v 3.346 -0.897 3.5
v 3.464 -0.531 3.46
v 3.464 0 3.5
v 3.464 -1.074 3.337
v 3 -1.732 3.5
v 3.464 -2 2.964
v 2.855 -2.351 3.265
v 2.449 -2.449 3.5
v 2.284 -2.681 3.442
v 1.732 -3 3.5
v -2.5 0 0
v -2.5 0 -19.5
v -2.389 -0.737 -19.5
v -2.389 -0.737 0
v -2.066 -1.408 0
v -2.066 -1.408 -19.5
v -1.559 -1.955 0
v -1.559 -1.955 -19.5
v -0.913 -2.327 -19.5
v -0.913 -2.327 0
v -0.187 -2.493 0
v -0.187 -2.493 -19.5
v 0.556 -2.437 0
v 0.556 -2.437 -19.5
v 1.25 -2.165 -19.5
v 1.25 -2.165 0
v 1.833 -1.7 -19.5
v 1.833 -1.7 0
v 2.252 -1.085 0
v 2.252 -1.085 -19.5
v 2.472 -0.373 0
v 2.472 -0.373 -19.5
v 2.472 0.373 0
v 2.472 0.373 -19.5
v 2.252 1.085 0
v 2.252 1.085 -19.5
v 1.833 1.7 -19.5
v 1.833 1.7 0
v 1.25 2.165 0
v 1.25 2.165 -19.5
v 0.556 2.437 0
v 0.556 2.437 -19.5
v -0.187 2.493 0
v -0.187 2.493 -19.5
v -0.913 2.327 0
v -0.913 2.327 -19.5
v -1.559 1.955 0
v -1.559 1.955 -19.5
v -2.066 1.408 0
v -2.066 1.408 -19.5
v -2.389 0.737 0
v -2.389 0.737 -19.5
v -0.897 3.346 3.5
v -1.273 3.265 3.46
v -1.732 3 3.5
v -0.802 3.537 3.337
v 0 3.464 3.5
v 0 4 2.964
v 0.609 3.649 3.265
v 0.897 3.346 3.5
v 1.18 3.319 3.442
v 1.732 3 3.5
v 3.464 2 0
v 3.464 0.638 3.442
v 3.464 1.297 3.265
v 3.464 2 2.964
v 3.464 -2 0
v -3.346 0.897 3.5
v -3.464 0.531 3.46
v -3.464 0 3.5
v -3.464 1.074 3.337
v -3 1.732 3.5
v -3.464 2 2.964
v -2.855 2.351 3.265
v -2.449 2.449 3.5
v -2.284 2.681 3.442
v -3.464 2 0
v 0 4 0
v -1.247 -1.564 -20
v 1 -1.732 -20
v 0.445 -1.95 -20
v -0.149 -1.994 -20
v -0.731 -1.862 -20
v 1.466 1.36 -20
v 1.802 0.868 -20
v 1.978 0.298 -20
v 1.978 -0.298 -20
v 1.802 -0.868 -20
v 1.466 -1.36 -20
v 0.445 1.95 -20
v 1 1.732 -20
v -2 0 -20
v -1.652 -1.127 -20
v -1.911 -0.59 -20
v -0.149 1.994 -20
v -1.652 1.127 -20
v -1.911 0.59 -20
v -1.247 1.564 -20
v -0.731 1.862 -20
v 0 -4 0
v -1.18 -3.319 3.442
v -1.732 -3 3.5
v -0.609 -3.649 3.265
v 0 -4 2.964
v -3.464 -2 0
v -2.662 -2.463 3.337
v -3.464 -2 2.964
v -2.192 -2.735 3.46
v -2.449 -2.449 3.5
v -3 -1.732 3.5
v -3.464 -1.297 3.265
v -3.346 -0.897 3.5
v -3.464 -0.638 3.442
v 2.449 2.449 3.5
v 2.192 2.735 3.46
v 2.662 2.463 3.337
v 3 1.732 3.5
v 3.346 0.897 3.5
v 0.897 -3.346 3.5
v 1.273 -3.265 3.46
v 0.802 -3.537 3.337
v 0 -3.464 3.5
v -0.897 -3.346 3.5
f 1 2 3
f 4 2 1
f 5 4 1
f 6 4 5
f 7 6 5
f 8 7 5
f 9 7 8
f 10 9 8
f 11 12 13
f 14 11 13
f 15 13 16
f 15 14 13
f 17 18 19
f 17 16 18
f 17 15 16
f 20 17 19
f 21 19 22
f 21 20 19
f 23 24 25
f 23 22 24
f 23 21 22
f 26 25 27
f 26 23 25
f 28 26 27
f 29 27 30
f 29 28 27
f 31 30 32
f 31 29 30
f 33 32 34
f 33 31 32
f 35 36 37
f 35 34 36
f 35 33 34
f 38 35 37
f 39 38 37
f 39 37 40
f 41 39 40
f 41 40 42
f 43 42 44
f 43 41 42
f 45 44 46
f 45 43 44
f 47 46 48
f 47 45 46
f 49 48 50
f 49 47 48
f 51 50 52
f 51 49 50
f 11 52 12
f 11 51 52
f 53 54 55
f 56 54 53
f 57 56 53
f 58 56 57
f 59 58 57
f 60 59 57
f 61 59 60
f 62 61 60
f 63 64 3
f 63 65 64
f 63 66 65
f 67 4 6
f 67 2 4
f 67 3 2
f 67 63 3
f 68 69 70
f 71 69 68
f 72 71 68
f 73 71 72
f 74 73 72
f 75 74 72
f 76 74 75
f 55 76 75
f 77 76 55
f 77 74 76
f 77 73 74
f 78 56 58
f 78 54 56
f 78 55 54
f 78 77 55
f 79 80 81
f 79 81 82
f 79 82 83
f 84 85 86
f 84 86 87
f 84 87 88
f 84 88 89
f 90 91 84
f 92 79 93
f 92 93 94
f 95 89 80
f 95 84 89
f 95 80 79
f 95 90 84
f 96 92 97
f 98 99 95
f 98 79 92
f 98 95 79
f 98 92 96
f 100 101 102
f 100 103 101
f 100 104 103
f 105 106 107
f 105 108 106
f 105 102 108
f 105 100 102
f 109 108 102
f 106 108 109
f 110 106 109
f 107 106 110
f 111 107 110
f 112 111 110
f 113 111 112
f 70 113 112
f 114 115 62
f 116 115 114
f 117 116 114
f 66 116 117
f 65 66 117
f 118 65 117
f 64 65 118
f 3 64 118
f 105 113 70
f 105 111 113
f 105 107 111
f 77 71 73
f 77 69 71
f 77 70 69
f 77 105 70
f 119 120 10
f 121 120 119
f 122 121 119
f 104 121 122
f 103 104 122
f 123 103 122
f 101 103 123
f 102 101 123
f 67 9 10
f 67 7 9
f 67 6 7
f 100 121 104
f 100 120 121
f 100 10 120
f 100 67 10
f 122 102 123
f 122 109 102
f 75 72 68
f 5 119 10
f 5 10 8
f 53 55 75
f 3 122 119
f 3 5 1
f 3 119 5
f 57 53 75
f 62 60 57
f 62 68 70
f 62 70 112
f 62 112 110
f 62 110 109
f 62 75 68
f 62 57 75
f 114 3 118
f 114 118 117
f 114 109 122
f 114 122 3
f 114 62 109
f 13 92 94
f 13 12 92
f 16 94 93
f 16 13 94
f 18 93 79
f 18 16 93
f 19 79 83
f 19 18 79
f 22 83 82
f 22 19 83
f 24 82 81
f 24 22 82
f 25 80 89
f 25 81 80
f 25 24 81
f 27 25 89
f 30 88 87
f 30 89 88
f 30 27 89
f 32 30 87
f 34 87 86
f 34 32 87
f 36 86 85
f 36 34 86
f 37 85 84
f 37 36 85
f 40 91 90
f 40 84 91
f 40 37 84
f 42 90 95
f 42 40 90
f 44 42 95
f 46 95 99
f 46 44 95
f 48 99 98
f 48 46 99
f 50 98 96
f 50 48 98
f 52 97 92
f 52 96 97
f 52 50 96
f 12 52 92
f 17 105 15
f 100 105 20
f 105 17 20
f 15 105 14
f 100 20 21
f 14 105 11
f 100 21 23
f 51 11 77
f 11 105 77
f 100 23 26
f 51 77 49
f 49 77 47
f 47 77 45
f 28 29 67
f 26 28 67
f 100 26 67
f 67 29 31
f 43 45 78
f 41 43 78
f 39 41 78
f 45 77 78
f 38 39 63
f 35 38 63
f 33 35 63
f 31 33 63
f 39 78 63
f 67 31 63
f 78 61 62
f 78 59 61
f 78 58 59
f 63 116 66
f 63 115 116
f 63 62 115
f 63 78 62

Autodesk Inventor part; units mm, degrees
ref_plane "YZ-Ebene" through (0, 0, 0) normal (1, 0, 0) x (0, 1, 0)
ref_plane "XZ-Ebene" through (0, 0, 0) normal (0, 1, 0) x (-1, 0, 0)
ref_plane "XY-Ebene" through (0, 0, 0) normal (0, 0, 1) x (1, 0, 0)
sketch "Skizze1" plane through (0, 0, 0) normal (0, 0, 1) x (1, 0, 0)
  line L0 (-4.8497, 0) -> (4.8497, 0) projected
  line L1 (0, -5.6) -> (0, 5.6) projected
  line L2 (0, 4) -> (3.4641, 2)
  line L3 (3.4641, 2) -> (3.4641, -2)
  line L4 (3.4641, -2) -> (0, -4)
  line L5 (0, -4) -> (-3.4641, -2)
  line L6 (-3.4641, -2) -> (-3.4641, 2)
  line L7 (-3.4641, 2) -> (0, 4)
  point P0 (0, 0)
  dimension "d9" = 8
extrude "Extrusion1" add sketch "Skizze1" along normal blind 3.5
sketch "Skizze2" plane through (0, 0, 3.5) normal (0, 0, 1) x (1, 0, 0)
  line L0 (3.4641, 2) -> (0, 4) projected
  circle A0 centre (0, 0) radius 3.4641
extrude "Extrusion2" cut sketch "Skizze2" against normal blind 3.5 draft 45 keep common part
sketch "Skizze3" plane through (0, 0, 0) normal (0, 0, -1) x (-1, 0, 0)
  circle A0 centre (0, 0) radius 2.5
  dimension "d6" = 5
extrude "Extrusion3" add sketch "Skizze3" along normal blind 20
chamfer "Fase1" distance 0.5 angle 45 1 edges at (2.5, 0, -20)
thread "Gewinde1" size "M5x0.5" class "6g" standard "ISO Metric profile" length 15
thread "Gewinde2" size "M5x0.5" class "6g" standard "ISO Metric profile" length 15
thread "Gewinde3" size "M5x0.5" class "6g" standard "ISO Metric profile" length 15.5
properties part number "Sechskantenschraube_ra8846s" material "Stahl, hochfest, niedrig legiert"
